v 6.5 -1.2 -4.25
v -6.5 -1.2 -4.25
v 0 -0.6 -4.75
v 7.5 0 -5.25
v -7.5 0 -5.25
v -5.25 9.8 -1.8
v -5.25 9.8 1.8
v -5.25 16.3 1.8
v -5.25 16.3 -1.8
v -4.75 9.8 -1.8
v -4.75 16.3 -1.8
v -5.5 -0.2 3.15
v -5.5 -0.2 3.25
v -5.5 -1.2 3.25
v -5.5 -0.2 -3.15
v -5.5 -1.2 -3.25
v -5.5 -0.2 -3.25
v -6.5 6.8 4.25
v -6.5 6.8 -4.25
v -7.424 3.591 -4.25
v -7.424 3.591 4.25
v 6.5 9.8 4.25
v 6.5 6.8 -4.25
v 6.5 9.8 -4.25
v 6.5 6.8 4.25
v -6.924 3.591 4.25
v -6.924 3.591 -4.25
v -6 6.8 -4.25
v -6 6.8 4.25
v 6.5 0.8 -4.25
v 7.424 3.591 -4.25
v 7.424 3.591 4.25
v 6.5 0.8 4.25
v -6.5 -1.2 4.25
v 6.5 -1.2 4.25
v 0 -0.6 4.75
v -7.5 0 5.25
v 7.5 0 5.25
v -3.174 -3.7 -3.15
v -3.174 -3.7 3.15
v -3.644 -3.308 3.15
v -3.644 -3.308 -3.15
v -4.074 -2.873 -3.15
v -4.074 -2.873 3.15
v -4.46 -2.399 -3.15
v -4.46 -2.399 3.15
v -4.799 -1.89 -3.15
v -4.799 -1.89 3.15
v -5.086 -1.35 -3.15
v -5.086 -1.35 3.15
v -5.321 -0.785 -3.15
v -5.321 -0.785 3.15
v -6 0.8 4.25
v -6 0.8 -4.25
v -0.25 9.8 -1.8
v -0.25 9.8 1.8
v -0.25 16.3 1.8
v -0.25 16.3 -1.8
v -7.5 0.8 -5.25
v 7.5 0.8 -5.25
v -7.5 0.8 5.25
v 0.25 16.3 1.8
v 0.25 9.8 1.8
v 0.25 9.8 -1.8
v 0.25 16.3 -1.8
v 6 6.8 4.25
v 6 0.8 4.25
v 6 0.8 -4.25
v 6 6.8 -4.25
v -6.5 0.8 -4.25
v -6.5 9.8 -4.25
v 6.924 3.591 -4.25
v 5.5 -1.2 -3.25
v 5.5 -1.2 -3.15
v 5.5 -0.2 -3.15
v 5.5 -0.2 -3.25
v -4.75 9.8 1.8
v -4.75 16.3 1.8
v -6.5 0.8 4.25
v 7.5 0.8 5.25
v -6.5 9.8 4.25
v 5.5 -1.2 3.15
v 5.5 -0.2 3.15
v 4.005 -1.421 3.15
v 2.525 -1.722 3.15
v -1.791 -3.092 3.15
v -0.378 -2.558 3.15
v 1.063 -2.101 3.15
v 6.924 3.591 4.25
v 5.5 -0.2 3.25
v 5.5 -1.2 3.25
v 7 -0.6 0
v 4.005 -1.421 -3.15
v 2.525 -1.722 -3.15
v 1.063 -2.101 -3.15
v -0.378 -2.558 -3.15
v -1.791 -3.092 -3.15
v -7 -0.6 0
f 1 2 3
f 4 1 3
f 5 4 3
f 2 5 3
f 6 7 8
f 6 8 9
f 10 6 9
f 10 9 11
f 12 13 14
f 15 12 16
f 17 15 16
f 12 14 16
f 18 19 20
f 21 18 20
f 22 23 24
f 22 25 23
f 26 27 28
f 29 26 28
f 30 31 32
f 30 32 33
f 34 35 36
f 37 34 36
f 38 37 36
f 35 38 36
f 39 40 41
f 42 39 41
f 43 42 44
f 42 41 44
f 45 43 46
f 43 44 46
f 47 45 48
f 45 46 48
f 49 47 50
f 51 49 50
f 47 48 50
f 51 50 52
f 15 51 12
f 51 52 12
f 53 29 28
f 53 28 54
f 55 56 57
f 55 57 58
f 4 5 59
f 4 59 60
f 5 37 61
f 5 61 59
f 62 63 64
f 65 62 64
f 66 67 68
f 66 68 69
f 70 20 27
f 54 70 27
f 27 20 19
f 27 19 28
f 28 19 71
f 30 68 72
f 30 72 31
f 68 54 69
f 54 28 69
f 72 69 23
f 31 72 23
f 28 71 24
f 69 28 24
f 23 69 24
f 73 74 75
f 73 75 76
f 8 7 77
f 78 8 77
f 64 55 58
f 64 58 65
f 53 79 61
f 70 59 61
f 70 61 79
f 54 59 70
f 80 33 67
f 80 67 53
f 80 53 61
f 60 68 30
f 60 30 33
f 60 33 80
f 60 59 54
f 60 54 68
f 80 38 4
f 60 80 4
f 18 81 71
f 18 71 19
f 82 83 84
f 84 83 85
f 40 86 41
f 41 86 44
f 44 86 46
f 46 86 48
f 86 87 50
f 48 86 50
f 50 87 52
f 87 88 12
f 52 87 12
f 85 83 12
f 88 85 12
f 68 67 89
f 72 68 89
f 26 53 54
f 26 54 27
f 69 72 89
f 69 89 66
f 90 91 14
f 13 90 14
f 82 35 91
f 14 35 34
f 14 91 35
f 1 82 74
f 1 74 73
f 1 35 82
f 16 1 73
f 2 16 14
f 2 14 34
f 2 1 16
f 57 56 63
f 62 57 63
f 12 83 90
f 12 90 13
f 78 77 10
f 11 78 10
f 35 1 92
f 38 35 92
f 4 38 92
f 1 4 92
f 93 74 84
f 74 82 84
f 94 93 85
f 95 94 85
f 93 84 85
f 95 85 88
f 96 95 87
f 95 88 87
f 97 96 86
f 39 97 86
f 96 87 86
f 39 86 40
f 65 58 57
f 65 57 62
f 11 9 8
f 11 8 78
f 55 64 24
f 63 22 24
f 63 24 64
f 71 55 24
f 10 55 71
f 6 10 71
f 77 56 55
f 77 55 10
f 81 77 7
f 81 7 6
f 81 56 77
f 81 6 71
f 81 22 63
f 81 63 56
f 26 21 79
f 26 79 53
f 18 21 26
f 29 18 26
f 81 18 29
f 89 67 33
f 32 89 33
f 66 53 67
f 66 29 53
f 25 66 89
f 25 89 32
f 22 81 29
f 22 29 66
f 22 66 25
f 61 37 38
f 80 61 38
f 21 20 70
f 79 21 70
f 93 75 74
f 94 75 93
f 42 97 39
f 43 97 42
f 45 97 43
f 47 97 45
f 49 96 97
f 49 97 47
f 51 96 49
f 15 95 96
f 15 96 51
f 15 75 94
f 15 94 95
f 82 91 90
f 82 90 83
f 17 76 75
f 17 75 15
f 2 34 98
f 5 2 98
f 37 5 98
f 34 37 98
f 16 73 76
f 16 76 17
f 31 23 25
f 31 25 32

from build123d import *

# Parameters (mm, degrees)
SKETCH_1_W          = 15
SKETCH_1_H          = 10.5
EXTRUDE_1_DEPTH     = 0.8
SKETCH_2_W          = 13
SKETCH_2_H          = 8.5
EXTRUDE_2_DEPTH     = 4.25
EXTRUDE_4_DEPTH     = 8.5
SKETCH_5_W          = 0.5
SKETCH_5_H          = 3.6
EXTRUDE_5_DEPTH     = 6.5
SKETCH_6_W          = 11
SKETCH_6_H          = 6.5
CUT_EXTRUDE_1_DEPTH = 1
EXTRUDE_6_DEPTH     = 3.15


with BuildPart() as part:
    # 草图1 → 凸台-拉伸1 (new body)
    with BuildSketch(Plane(origin=(0, 0, 0), x_dir=(1, 0, 0), z_dir=(0, 1, 0))):
        Rectangle(SKETCH_1_W, SKETCH_1_H)
    extrude(amount=EXTRUDE_1_DEPTH)

    # 草图2 → section 0 of loft_1
    with BuildSketch(Plane(origin=(0, -1.2, 0), x_dir=(-1, 0, 0), z_dir=(0, -1, 0)), mode=Mode.PRIVATE) as loft_1_s0:
        Rectangle(SKETCH_2_W, SKETCH_2_H)
    # loft up to a face of the part (loft_1)
    loft([loft_1_s0.sketch, part.faces().sort_by_distance((0, 0, 0))[0]])

    # 草图3 → 凸台-拉伸2 (add, symmetric)
    with BuildSketch(Plane.XY):
        Polygon((6.5, 9.8), (-6.5, 9.8), (-6.5, 6.8), (-6, 6.8), (-6, 0.8), (6, 0.8), (6, 6.8), (6.5, 6.8), align=None)
    extrude(amount=EXTRUDE_2_DEPTH, both=True)

    # 草图4 → 凸台-拉伸4 (add)
    with BuildSketch(Plane(origin=(0, 0, -4.25), x_dir=(-1, 0, 0), z_dir=(0, 0, -1))):
        Polygon((6.5, 6.8), (7.423732472, 3.591094946), (6.5, 0.8), (6, 0.8), (6.923732472, 3.591094946), (6, 6.8), align=None)
        Polygon((-6, 6.8), (-6.5, 6.8), (-7.423732472, 3.591094946), (-6.5, 0.8), (-6, 0.8), (-6.923732472, 3.591094946), align=None)
    extrude(amount=-EXTRUDE_4_DEPTH)

    # 草图5 → 凸台-拉伸5 (add)
    with BuildSketch(Plane(origin=(0, 9.8, 0), x_dir=(1, 0, 0), z_dir=(0, 1, 0))):
        Rectangle(SKETCH_5_W, SKETCH_5_H)
        with Locations((-5, 0)):
            Rectangle(SKETCH_5_W, SKETCH_5_H)
    extrude(amount=EXTRUDE_5_DEPTH)

    # 草图6 → 切除-拉伸1 (cut)
    with BuildSketch(Plane(origin=(0, -1.2, 0), x_dir=(-1, 0, 0), z_dir=(0, -1, 0))):
        Rectangle(SKETCH_6_W, SKETCH_6_H)
    extrude(amount=-CUT_EXTRUDE_1_DEPTH, mode=Mode.SUBTRACT)

    # 草图7 → 凸台-拉伸6 (add, symmetric)
    with BuildSketch(Plane.XY):
        with BuildLine():
            Line((-5.5, -0.2), (5.5, -0.2))
            Line((5.5, -0.2), (5.5, -1.2))
            ThreePointArc((5.5, -1.2), (1.062510248, -2.101360111), (-3.174011421, -3.7))
            ThreePointArc((-3.174011421, -3.7), (-4.635468683, -2.14834899), (-5.5, -0.2))
        make_face()
    extrude(amount=EXTRUDE_6_DEPTH, both=True)


solid = part.part
